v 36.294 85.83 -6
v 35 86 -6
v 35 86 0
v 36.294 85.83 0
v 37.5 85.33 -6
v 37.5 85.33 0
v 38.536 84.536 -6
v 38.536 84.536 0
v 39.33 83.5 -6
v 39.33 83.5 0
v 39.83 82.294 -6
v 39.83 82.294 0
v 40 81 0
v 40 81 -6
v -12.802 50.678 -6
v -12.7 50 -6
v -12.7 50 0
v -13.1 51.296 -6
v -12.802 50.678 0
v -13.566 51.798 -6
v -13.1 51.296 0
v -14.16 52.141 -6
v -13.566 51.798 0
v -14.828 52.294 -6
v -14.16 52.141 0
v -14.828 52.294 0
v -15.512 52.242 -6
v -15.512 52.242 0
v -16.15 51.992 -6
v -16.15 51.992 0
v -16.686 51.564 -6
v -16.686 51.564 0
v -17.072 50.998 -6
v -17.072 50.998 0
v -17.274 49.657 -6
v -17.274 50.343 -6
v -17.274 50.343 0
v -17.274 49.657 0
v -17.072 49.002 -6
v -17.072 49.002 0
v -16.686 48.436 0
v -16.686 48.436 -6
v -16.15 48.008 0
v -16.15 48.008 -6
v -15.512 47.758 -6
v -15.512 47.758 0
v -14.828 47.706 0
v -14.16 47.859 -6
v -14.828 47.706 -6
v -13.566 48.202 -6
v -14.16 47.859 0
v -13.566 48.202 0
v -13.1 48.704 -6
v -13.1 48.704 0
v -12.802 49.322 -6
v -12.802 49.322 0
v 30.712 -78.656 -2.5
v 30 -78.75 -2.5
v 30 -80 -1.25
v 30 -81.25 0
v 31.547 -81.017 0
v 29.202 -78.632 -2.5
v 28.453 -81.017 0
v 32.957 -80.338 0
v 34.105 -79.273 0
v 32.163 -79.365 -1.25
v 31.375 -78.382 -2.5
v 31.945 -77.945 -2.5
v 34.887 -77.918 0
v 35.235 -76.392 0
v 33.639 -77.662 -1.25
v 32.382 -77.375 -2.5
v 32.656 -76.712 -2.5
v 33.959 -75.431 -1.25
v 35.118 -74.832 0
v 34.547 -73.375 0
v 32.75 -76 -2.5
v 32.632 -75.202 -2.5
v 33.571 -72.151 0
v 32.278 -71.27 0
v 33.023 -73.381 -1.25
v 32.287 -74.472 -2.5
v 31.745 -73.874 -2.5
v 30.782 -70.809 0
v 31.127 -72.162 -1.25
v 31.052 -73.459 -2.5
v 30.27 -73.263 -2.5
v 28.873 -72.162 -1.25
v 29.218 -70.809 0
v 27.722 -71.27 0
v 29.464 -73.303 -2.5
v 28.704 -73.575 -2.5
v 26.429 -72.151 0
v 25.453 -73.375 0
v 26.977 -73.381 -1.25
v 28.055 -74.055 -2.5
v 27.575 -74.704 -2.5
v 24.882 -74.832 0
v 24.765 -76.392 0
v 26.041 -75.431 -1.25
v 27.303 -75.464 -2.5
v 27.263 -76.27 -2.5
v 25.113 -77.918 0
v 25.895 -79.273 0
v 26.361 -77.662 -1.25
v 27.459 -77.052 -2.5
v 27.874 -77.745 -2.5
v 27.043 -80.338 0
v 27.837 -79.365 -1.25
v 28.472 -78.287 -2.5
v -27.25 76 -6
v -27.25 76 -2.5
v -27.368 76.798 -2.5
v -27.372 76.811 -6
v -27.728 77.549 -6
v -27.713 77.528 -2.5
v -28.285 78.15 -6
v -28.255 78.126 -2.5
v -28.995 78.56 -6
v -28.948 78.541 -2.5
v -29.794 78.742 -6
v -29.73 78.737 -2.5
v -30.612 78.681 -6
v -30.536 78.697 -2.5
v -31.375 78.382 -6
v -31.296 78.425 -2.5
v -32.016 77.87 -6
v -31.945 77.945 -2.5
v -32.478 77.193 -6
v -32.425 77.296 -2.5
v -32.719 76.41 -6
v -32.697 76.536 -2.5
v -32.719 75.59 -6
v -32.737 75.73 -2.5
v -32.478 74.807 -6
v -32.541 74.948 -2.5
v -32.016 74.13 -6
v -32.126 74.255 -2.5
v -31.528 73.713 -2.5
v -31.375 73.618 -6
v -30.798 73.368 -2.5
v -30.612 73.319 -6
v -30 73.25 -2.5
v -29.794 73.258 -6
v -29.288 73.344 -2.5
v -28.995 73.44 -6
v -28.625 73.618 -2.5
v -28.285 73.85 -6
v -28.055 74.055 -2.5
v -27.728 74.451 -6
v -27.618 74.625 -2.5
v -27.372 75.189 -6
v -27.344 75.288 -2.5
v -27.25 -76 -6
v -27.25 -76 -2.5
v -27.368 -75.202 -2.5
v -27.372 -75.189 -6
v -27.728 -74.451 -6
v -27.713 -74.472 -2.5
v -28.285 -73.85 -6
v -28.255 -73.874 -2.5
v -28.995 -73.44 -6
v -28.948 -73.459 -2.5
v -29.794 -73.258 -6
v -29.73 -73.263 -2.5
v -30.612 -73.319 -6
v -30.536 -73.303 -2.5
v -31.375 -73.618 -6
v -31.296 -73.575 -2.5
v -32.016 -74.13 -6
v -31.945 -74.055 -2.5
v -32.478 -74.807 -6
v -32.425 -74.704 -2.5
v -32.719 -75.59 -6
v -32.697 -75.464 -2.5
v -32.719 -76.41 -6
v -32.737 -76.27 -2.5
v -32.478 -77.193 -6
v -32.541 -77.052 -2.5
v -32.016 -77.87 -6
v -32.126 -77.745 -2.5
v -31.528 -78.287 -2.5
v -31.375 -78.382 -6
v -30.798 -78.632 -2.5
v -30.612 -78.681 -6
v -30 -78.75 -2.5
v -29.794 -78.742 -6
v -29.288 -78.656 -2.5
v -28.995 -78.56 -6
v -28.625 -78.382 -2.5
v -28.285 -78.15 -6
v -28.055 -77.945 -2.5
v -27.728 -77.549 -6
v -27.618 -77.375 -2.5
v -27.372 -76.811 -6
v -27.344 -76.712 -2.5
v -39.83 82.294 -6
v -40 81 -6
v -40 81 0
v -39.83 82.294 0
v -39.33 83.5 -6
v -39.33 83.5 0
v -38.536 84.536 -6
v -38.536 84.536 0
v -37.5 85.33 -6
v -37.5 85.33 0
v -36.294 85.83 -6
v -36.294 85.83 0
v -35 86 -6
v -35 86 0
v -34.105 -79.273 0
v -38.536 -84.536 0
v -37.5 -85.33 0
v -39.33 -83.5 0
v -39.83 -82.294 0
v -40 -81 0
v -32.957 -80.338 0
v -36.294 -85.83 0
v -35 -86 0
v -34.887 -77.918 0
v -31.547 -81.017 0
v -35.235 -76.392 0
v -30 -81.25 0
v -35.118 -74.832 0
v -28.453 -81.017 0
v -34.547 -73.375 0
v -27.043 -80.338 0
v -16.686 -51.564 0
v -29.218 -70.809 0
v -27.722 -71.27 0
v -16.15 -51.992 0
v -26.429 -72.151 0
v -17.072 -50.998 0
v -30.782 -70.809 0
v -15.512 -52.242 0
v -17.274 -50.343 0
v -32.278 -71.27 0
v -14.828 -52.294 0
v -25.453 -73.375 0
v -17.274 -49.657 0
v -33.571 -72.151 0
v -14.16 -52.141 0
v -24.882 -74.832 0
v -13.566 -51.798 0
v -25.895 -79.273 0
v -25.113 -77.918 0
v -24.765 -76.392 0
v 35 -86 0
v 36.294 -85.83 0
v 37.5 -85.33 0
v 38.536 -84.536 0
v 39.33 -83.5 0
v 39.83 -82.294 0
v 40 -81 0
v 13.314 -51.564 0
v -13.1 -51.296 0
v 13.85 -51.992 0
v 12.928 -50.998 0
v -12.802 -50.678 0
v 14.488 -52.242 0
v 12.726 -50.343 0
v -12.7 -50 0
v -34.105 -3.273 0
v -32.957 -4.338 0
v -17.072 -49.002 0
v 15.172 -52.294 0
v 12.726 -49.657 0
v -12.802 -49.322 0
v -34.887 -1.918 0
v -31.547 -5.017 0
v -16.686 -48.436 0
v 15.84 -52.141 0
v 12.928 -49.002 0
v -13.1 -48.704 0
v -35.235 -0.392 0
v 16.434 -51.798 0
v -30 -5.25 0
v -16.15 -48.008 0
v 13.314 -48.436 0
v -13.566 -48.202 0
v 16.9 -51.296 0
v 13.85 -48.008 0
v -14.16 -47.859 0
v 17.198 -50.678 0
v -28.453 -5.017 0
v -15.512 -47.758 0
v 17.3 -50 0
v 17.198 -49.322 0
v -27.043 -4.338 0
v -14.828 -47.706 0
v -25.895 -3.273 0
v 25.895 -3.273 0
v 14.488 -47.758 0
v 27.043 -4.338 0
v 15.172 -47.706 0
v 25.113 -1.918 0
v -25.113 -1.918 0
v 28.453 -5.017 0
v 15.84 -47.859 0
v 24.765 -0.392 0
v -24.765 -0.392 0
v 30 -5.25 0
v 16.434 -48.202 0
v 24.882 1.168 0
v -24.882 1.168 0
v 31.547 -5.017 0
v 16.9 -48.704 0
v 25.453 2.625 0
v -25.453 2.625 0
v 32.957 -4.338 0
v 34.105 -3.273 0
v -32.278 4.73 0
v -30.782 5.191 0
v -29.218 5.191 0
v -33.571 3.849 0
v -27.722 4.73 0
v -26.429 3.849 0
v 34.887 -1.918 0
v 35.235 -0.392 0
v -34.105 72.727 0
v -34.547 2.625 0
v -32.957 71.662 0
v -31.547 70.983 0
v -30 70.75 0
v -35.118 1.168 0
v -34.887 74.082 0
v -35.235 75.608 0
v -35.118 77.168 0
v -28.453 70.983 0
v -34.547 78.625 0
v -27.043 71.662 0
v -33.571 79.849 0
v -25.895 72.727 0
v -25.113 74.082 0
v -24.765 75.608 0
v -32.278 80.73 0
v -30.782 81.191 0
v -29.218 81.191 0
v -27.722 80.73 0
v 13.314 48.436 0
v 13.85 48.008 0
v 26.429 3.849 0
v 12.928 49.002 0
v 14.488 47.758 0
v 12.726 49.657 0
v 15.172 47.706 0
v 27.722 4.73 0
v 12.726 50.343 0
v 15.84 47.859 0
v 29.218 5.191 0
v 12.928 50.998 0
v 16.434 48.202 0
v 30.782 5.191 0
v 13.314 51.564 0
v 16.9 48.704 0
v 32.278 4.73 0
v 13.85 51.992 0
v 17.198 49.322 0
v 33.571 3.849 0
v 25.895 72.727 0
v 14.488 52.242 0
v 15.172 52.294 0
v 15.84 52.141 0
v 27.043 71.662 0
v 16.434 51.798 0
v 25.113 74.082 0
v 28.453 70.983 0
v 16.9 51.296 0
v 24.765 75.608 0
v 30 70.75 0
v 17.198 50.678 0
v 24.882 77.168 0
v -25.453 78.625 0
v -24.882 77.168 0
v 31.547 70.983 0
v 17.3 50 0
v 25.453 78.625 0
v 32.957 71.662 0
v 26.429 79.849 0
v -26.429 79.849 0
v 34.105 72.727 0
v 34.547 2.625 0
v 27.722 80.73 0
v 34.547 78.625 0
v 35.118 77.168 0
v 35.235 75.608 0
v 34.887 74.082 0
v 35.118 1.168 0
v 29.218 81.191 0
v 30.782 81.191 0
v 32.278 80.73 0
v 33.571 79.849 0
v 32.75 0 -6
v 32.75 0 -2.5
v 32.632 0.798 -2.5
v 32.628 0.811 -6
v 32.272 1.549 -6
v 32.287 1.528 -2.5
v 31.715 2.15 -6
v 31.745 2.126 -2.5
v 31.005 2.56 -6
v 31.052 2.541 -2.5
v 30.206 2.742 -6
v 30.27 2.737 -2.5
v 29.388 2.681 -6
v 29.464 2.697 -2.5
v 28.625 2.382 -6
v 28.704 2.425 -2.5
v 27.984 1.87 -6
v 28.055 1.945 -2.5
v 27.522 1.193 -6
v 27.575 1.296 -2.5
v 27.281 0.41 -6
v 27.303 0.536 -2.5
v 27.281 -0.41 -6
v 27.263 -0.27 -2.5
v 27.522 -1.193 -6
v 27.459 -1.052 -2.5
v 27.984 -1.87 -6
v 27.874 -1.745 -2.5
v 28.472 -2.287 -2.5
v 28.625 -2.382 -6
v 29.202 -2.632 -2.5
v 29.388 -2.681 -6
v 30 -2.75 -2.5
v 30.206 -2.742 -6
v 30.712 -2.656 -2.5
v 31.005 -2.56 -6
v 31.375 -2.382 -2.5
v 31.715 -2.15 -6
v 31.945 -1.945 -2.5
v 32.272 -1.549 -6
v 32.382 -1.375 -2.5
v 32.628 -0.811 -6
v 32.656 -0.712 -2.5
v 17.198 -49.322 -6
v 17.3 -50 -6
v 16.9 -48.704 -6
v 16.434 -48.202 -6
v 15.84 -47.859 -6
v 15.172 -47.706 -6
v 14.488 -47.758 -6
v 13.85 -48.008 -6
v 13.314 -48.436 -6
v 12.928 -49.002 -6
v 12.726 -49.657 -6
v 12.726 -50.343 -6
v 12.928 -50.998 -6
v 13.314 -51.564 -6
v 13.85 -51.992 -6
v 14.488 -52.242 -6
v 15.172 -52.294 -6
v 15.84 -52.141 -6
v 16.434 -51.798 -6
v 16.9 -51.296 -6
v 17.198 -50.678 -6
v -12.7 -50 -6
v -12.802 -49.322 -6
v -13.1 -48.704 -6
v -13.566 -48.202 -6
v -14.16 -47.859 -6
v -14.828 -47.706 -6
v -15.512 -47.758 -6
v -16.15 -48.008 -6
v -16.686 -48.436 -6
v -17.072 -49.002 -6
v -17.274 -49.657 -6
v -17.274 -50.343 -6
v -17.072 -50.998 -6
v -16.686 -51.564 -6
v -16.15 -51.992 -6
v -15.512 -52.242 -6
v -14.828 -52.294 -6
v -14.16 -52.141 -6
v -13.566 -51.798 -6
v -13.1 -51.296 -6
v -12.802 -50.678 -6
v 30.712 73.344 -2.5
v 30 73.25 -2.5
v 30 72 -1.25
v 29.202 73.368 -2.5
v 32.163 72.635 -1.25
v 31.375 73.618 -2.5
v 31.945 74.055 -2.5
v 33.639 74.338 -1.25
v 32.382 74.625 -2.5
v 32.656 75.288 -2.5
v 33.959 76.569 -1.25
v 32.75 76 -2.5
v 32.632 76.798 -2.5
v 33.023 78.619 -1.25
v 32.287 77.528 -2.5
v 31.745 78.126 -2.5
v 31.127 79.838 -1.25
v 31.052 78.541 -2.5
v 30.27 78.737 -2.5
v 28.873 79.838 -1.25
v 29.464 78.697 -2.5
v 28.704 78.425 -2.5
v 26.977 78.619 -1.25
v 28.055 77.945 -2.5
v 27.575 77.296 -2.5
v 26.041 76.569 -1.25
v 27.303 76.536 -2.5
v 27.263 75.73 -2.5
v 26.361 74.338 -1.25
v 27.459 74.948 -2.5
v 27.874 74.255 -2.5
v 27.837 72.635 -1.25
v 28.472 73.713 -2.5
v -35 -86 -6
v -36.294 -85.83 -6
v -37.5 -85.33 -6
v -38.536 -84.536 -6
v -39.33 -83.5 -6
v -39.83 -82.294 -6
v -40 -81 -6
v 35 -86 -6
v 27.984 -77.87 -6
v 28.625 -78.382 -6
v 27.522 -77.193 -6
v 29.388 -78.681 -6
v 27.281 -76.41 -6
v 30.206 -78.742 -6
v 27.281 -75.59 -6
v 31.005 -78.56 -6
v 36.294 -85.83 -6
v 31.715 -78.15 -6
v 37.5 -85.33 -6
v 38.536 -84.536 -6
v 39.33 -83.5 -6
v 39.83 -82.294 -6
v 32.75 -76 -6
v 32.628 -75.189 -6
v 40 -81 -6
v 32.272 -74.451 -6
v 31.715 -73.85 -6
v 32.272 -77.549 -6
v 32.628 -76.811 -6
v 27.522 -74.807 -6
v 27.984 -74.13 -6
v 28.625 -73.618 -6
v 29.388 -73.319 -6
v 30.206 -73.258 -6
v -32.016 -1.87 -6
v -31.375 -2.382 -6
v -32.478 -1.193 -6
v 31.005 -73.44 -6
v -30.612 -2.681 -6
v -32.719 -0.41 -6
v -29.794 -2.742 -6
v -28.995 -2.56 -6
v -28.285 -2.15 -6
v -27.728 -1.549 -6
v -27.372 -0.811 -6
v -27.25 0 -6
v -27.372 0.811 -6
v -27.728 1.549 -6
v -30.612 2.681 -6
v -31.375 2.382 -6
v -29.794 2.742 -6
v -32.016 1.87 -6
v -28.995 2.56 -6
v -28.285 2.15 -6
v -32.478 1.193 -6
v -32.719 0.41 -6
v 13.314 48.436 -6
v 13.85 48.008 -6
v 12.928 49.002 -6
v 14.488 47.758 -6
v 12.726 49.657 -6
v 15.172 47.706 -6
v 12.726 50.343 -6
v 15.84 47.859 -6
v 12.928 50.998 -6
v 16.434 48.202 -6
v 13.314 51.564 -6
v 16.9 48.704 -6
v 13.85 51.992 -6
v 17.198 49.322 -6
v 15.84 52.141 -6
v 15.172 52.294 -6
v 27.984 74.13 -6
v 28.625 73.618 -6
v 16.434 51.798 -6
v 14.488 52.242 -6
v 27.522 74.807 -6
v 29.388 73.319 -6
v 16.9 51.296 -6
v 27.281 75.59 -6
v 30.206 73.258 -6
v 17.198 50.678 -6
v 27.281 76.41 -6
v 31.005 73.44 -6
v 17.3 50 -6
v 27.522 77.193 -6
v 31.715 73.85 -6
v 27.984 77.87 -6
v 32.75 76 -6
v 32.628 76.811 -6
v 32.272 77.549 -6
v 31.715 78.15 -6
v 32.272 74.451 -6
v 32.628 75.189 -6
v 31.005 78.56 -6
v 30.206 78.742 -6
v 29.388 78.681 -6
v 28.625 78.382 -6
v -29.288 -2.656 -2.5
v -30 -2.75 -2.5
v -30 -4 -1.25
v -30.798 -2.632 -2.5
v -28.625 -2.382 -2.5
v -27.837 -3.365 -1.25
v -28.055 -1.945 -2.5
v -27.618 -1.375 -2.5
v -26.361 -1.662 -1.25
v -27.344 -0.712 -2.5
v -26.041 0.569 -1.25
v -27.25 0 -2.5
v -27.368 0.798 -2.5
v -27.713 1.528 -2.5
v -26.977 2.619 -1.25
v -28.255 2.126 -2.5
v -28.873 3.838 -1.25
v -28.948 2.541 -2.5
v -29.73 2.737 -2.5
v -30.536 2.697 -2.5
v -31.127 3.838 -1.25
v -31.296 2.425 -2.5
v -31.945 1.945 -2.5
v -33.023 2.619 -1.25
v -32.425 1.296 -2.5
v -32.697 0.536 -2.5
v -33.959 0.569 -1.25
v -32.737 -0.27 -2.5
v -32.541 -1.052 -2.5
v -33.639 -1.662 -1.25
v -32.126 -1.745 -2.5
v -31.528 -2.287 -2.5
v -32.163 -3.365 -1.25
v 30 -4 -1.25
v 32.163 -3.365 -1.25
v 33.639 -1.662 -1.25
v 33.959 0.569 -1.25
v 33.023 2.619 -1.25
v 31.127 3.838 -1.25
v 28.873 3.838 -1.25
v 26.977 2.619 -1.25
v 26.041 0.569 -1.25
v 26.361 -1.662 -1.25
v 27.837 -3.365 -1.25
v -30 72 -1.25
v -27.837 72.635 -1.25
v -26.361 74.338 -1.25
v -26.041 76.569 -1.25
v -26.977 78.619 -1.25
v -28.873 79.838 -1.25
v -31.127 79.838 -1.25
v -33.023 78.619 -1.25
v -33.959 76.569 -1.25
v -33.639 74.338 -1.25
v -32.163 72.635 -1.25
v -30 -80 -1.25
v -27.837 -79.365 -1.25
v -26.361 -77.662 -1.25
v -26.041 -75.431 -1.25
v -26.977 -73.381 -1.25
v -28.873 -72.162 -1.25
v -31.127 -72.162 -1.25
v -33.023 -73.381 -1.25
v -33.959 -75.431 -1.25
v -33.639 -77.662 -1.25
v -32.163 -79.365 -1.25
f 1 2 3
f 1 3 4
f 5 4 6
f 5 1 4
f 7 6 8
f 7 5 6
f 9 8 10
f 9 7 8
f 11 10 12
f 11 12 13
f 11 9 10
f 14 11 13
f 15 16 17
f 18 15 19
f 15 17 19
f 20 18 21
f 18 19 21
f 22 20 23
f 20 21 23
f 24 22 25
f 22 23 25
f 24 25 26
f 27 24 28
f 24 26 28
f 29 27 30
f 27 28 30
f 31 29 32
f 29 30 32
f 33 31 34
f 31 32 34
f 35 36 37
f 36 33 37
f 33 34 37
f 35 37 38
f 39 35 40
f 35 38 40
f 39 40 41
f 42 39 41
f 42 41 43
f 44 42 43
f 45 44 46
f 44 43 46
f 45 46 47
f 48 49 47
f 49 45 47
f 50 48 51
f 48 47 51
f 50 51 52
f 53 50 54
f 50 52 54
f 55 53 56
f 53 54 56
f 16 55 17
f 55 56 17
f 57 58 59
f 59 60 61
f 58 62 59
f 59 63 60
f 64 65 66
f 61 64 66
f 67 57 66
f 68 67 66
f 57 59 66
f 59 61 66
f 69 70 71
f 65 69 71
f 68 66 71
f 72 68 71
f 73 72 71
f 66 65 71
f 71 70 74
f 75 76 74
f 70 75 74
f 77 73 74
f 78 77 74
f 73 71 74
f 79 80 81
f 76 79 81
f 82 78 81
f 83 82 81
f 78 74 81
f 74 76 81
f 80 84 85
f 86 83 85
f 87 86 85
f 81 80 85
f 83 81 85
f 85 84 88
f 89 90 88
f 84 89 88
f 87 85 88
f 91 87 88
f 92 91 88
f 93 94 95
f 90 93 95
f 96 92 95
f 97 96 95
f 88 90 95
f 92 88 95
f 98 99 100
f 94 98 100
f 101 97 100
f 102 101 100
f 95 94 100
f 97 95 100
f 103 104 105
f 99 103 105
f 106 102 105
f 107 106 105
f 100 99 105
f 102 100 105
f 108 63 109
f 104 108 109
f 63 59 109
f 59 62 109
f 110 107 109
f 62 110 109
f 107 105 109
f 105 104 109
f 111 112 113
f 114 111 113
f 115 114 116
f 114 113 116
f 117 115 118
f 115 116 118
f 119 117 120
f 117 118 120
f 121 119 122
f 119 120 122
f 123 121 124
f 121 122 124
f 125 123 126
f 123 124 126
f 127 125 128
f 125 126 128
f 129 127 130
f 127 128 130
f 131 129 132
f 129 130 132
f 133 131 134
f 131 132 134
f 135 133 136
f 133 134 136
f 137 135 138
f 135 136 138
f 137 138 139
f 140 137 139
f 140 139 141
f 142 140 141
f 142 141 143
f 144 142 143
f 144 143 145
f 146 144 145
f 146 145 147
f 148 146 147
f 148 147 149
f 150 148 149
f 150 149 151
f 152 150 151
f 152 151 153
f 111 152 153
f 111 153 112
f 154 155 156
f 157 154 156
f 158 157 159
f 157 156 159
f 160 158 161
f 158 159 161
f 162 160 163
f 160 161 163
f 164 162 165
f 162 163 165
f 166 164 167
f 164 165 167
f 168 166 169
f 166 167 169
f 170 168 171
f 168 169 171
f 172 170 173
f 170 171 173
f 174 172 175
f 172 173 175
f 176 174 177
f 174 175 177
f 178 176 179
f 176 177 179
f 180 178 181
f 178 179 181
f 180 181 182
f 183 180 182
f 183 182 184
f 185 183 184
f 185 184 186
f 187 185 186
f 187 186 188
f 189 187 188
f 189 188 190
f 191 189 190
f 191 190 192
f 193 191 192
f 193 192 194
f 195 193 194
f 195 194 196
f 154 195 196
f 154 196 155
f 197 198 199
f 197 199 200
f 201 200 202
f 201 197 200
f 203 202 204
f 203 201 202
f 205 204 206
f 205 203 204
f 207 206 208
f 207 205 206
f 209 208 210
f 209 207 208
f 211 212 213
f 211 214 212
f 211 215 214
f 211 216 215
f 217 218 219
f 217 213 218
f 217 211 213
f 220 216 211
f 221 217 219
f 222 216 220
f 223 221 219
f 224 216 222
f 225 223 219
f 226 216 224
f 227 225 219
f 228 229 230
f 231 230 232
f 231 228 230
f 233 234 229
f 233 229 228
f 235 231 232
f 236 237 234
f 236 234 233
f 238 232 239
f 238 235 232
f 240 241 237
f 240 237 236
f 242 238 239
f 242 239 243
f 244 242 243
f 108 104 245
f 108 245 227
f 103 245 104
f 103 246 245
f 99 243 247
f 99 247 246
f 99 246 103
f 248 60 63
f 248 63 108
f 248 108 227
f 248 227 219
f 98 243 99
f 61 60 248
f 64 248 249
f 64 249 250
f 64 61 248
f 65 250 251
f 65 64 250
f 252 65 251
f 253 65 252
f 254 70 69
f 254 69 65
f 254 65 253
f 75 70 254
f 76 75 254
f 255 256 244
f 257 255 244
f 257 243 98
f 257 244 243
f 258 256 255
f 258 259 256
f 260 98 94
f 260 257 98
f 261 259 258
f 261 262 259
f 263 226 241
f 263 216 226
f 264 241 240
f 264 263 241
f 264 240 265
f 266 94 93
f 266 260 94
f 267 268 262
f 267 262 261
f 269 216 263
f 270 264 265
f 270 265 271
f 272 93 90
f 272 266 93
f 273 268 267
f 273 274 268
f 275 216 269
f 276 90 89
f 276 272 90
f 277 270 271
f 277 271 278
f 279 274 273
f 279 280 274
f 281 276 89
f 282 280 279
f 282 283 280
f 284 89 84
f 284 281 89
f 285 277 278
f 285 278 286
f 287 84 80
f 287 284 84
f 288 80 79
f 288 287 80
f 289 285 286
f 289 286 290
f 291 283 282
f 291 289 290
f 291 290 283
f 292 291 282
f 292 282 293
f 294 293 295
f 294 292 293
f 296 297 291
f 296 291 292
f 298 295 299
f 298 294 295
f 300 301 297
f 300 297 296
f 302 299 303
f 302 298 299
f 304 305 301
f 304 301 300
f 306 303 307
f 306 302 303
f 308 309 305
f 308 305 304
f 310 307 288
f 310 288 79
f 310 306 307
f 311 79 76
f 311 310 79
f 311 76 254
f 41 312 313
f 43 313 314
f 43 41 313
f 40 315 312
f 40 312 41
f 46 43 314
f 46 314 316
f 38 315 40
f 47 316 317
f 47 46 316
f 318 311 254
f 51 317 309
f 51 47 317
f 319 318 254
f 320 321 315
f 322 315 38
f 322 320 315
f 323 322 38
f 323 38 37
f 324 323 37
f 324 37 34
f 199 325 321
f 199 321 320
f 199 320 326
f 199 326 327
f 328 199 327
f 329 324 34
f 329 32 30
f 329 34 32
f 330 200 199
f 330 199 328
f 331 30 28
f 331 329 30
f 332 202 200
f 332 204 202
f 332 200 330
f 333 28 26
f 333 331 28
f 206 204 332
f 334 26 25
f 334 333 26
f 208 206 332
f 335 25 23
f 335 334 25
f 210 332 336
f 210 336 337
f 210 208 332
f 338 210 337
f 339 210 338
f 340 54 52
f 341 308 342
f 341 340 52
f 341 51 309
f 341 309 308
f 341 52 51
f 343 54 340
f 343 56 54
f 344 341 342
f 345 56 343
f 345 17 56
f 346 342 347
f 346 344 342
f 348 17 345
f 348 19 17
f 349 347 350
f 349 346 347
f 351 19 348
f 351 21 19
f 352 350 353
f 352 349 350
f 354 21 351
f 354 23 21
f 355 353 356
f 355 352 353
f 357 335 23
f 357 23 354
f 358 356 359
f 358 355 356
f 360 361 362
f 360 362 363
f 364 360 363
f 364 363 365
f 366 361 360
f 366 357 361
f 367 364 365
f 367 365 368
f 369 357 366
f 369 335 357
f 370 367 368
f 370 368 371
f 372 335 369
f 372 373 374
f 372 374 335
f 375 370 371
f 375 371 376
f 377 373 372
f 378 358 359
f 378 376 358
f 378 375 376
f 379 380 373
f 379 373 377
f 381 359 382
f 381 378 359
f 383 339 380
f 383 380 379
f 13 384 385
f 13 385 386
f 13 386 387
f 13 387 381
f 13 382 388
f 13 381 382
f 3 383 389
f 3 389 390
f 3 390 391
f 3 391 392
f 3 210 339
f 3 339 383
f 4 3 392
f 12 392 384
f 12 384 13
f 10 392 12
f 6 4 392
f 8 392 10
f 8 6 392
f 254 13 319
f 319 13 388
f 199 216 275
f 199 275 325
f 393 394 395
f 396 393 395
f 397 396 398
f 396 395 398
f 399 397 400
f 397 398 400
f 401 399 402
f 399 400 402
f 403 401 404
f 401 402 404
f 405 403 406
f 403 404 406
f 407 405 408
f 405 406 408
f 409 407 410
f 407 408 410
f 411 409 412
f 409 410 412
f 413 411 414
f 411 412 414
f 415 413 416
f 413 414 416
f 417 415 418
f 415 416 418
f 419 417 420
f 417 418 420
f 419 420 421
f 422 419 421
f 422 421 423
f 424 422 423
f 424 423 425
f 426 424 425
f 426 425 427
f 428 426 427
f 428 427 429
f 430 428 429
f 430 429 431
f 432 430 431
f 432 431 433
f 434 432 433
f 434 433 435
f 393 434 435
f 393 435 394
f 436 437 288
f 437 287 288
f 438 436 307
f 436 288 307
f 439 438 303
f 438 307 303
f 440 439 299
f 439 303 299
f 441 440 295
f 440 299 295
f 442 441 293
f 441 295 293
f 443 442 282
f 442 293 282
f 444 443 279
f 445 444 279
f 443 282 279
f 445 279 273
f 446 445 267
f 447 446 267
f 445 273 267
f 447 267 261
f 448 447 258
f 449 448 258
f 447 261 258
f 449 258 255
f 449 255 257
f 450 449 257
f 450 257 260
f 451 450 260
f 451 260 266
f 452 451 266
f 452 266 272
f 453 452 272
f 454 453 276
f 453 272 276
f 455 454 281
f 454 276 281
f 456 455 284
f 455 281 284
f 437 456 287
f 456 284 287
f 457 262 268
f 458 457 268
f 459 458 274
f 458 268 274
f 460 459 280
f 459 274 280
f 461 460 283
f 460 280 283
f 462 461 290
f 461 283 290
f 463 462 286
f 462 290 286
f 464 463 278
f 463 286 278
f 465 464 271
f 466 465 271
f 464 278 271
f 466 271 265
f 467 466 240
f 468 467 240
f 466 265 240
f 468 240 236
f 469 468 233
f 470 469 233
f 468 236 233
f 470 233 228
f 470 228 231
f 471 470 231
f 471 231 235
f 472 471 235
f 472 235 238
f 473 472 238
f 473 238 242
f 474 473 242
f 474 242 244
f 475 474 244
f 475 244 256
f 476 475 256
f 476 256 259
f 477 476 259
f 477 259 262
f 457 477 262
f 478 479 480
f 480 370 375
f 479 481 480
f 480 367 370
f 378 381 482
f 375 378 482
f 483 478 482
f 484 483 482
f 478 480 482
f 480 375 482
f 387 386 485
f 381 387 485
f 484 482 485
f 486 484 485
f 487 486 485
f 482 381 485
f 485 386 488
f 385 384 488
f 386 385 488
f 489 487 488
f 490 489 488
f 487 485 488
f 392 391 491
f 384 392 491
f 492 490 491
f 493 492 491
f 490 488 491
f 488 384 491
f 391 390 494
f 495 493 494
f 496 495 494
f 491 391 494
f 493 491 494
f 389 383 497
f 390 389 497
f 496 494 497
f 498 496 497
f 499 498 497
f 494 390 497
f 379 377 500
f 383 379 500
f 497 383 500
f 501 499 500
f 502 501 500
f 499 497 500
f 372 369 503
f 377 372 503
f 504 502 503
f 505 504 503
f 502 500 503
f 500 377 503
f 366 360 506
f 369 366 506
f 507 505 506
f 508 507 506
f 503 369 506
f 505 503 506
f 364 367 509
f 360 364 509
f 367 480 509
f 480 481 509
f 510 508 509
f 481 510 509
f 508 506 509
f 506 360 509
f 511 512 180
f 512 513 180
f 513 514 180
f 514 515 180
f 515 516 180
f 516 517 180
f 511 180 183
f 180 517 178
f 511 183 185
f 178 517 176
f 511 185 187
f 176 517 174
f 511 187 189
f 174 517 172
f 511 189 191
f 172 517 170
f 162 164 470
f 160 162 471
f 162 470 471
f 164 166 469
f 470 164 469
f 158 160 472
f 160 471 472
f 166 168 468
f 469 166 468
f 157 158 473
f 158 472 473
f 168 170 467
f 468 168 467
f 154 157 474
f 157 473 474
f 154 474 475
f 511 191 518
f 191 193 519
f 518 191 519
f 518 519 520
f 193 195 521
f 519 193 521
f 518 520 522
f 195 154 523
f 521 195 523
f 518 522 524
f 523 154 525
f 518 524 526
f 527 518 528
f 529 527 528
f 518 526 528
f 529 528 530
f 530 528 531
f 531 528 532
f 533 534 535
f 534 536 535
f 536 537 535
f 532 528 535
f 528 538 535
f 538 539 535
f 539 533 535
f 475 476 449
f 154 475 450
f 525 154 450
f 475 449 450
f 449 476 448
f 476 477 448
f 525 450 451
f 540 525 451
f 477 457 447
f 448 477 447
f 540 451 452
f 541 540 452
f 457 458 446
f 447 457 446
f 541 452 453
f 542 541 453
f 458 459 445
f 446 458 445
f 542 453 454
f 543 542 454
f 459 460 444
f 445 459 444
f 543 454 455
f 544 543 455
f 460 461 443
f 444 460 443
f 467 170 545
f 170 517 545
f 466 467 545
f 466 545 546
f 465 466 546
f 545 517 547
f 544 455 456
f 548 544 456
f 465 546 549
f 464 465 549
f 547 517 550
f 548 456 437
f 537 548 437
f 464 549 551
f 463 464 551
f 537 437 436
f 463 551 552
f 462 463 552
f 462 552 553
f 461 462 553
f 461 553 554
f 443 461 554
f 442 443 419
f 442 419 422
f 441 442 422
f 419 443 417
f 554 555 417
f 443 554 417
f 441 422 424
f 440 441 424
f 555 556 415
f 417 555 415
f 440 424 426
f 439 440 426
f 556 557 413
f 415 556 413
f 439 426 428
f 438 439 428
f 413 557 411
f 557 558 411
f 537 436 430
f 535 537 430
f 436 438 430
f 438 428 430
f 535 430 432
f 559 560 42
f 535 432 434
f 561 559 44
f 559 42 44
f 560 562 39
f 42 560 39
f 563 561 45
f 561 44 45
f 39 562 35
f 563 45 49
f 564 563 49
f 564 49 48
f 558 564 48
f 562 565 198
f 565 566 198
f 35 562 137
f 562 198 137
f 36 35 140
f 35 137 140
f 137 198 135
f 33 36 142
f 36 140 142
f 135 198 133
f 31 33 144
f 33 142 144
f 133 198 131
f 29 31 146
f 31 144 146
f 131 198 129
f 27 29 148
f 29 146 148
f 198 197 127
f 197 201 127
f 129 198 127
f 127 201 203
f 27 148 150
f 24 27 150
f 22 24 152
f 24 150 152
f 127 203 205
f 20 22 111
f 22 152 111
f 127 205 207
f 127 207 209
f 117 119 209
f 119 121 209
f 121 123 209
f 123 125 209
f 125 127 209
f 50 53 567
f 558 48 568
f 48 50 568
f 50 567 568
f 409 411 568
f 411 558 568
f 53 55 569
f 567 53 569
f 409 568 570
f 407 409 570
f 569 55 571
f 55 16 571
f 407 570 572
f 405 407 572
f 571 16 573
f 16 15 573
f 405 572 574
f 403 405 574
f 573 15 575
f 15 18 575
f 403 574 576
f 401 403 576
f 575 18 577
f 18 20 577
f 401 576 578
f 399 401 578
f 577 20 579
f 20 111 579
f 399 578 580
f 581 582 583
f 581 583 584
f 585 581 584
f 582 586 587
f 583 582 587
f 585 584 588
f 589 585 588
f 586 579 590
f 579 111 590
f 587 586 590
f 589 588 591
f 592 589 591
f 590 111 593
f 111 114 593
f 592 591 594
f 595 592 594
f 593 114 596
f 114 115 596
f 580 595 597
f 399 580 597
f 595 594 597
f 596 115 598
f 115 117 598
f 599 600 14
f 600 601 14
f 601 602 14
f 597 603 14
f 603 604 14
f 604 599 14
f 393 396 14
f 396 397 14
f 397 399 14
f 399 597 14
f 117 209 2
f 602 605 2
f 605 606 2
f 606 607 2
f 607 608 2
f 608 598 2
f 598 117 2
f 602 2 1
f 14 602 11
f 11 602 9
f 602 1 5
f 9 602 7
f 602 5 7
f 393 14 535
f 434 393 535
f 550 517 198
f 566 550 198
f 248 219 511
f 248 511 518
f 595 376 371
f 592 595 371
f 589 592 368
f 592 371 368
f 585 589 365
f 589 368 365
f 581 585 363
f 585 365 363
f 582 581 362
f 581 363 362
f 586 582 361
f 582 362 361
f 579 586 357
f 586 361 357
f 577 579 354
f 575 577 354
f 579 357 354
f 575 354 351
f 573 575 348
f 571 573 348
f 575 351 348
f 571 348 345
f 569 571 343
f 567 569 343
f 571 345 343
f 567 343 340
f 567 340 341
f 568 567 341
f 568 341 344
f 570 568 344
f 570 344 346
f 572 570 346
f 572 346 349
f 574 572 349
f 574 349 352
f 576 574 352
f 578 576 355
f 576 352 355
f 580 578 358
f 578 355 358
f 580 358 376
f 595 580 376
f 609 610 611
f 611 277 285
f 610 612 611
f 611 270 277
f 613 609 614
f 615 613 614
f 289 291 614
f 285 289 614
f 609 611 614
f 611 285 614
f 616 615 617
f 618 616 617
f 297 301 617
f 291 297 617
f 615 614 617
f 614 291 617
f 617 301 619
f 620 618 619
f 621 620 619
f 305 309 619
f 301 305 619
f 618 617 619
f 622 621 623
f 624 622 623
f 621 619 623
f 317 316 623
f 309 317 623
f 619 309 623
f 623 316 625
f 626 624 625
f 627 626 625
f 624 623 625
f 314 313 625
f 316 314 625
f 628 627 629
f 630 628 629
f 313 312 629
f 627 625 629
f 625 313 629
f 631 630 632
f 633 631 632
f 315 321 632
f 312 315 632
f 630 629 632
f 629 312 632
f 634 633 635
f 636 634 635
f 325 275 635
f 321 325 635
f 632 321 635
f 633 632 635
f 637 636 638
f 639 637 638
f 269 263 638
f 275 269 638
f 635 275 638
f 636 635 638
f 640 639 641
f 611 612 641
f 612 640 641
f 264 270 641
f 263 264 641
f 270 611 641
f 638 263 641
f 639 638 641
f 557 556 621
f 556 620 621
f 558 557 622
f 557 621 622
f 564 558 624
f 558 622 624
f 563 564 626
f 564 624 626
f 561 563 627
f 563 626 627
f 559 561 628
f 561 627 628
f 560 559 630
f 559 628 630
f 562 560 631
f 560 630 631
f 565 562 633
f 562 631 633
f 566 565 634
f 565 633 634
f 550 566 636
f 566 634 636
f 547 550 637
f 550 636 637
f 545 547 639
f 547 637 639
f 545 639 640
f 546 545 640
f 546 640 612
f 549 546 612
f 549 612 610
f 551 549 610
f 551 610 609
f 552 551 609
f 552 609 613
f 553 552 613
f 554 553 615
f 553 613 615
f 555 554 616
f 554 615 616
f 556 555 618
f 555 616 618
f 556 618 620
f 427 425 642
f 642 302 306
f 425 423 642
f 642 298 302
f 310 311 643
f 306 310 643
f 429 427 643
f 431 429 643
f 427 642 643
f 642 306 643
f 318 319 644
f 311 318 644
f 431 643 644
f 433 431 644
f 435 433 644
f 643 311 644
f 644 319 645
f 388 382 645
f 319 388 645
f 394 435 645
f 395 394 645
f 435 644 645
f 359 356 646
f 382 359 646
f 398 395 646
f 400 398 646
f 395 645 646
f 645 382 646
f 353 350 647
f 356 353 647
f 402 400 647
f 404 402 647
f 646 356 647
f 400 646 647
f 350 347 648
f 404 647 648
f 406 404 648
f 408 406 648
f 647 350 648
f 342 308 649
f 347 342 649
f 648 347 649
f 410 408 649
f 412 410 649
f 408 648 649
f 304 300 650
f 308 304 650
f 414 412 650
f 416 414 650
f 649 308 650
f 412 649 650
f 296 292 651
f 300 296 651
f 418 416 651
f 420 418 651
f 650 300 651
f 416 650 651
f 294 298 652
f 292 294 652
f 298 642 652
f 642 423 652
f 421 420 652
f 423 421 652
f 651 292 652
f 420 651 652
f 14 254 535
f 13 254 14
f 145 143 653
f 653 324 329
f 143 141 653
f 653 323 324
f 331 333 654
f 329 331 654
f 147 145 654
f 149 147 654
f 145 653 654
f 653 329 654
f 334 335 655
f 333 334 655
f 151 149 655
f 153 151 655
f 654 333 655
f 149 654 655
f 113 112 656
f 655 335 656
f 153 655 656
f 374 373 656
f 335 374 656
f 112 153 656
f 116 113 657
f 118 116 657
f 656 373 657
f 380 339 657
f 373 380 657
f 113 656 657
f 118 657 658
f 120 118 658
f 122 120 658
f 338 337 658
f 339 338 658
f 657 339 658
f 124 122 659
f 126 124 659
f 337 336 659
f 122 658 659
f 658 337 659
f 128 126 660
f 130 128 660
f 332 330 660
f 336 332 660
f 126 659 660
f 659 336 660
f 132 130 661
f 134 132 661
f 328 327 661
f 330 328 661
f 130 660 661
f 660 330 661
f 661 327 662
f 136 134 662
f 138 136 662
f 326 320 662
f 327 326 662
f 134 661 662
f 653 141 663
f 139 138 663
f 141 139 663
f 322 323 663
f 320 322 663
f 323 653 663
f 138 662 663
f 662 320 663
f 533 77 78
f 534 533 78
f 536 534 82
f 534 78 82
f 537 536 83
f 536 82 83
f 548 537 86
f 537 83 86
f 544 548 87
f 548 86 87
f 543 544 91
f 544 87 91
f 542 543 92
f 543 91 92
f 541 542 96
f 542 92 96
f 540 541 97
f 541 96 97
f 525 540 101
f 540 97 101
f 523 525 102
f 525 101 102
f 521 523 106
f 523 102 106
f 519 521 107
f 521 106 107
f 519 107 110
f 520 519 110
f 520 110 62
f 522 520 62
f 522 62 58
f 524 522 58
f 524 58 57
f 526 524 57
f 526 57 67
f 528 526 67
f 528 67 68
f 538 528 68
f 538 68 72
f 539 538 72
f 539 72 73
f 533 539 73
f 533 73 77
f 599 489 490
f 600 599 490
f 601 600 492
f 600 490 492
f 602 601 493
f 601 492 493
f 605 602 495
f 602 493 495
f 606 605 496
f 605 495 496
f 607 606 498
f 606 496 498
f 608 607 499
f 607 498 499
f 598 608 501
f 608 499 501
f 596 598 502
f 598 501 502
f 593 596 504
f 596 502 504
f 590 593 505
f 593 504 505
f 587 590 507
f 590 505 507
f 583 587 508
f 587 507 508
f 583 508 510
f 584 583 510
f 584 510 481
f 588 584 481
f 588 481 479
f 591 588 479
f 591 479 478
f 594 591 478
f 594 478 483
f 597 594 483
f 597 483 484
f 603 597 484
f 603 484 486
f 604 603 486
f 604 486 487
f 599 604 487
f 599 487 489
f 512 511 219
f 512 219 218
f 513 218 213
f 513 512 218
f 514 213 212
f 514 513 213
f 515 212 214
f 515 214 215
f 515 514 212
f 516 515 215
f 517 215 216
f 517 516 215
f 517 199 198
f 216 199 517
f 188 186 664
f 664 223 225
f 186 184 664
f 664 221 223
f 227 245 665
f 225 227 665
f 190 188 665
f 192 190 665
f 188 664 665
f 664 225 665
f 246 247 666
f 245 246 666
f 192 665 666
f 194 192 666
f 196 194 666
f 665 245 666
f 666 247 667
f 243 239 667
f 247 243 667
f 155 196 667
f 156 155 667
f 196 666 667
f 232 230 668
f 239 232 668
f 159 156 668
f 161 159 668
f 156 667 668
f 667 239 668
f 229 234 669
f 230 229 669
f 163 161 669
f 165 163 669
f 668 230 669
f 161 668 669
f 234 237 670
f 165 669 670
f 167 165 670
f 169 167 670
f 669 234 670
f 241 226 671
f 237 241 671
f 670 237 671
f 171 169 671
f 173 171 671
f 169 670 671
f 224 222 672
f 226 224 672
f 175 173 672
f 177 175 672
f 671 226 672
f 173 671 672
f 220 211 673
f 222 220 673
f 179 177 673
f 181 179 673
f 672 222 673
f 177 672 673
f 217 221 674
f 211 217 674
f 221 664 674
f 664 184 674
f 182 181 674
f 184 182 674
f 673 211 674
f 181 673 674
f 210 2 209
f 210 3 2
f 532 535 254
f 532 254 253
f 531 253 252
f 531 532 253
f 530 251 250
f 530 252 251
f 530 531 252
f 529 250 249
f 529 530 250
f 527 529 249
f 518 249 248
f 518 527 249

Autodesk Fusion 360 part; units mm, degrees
sketch "Skizze2" plane through (0, 0, 0) normal (0, 0, 1) x (1, 0, 0)
  line L0 (15, 50) -> (-15, 50)
  line L1 (-15, 50) -> (-15, -50)
  line L2 (-15, -50) -> (15, -50)
  line L3 (15, -50) -> (15, 50)
  line L4 (15, 50) -> (-15, -50) construction
  line L5 (-15, 50) -> (15, -50) construction
  circle A0 centre (15, 50) radius 2.3
  circle A1 centre (-15, 50) radius 2.3
  circle A2 centre (-15, -50) radius 2.3
  circle A3 centre (15, -50) radius 2.3
  line L6 (40, 86) -> (-40, 86)
  line L7 (-40, 86) -> (-40, -86)
  line L8 (-40, -86) -> (40, -86)
  line L9 (40, -86) -> (40, 86)
  line L10 (40, 86) -> (-40, -86) construction
  line L11 (-40, 86) -> (40, -86) construction
  line L12 (-30, -86) -> (-30, 86)
  line L13 (30, 86) -> (30, -86)
  line L14 (0, 0) -> (0, -50)
  circle A4 centre (-30, -76) radius 2.75
  circle A5 centre (-30, 0) radius 2.75
  circle A6 centre (-30, 76) radius 2.75
  line L15 (-30, 76) -> (30, 76)
  line L16 (-30, 0) -> (30, 0)
  line L17 (-30, -76) -> (30, -76)
  circle A7 centre (30, -76) radius 2.75
  circle A8 centre (30, 0) radius 2.75
  circle A9 centre (30, 76) radius 2.75
  dimension "d1" = 4.6
  dimension "d2" = 30
  dimension "d3" = 100
  dimension "d4" = 36
  dimension "d5" = 80
  dimension "d6" = 60
  dimension "d7" = 10
  dimension "d8" = 10
  dimension "d9" = 5.5
extrude "Extrusion1" add sketch "Skizze2" against normal blind 6 contours L0 L1 L3 A0 A1 L12 L13 A5 A6 L15 L16 A8 A9 | L0 L1 L3 A0 A1 L16 | L1 L2 A2 L14 L16 | L1 L2 L3 A2 A3 L12 L13 A4 A5 L16 L17 A7 A8 | L2 L3 A3 L14 L16 | L6 L7 L8 L12 A4 A5 A6 | L6 L8 L9 L13 A7 A8 A9 | L6 L12 L13 A6 L15 A9 | L8 L12 L13 A4 L17 A7
fillet "Abrundung1" radius 5 4 edges at (40, -86, -3) (-40, -86, -3) (40, 86, -3) (-40, 86, -3)
hole "Bohrung1" at (30, 0, 0) at (30, 76, 0) at (30, -76, 0) at (-30, -76, 0) at (-30, 0, 0) at (-30, 76, 0) direction (0, 0, -1) diameter 5 depth 30 tip angle 118 countersink diameter 10.5 countersink angle 90
equation "d8 = d7"
